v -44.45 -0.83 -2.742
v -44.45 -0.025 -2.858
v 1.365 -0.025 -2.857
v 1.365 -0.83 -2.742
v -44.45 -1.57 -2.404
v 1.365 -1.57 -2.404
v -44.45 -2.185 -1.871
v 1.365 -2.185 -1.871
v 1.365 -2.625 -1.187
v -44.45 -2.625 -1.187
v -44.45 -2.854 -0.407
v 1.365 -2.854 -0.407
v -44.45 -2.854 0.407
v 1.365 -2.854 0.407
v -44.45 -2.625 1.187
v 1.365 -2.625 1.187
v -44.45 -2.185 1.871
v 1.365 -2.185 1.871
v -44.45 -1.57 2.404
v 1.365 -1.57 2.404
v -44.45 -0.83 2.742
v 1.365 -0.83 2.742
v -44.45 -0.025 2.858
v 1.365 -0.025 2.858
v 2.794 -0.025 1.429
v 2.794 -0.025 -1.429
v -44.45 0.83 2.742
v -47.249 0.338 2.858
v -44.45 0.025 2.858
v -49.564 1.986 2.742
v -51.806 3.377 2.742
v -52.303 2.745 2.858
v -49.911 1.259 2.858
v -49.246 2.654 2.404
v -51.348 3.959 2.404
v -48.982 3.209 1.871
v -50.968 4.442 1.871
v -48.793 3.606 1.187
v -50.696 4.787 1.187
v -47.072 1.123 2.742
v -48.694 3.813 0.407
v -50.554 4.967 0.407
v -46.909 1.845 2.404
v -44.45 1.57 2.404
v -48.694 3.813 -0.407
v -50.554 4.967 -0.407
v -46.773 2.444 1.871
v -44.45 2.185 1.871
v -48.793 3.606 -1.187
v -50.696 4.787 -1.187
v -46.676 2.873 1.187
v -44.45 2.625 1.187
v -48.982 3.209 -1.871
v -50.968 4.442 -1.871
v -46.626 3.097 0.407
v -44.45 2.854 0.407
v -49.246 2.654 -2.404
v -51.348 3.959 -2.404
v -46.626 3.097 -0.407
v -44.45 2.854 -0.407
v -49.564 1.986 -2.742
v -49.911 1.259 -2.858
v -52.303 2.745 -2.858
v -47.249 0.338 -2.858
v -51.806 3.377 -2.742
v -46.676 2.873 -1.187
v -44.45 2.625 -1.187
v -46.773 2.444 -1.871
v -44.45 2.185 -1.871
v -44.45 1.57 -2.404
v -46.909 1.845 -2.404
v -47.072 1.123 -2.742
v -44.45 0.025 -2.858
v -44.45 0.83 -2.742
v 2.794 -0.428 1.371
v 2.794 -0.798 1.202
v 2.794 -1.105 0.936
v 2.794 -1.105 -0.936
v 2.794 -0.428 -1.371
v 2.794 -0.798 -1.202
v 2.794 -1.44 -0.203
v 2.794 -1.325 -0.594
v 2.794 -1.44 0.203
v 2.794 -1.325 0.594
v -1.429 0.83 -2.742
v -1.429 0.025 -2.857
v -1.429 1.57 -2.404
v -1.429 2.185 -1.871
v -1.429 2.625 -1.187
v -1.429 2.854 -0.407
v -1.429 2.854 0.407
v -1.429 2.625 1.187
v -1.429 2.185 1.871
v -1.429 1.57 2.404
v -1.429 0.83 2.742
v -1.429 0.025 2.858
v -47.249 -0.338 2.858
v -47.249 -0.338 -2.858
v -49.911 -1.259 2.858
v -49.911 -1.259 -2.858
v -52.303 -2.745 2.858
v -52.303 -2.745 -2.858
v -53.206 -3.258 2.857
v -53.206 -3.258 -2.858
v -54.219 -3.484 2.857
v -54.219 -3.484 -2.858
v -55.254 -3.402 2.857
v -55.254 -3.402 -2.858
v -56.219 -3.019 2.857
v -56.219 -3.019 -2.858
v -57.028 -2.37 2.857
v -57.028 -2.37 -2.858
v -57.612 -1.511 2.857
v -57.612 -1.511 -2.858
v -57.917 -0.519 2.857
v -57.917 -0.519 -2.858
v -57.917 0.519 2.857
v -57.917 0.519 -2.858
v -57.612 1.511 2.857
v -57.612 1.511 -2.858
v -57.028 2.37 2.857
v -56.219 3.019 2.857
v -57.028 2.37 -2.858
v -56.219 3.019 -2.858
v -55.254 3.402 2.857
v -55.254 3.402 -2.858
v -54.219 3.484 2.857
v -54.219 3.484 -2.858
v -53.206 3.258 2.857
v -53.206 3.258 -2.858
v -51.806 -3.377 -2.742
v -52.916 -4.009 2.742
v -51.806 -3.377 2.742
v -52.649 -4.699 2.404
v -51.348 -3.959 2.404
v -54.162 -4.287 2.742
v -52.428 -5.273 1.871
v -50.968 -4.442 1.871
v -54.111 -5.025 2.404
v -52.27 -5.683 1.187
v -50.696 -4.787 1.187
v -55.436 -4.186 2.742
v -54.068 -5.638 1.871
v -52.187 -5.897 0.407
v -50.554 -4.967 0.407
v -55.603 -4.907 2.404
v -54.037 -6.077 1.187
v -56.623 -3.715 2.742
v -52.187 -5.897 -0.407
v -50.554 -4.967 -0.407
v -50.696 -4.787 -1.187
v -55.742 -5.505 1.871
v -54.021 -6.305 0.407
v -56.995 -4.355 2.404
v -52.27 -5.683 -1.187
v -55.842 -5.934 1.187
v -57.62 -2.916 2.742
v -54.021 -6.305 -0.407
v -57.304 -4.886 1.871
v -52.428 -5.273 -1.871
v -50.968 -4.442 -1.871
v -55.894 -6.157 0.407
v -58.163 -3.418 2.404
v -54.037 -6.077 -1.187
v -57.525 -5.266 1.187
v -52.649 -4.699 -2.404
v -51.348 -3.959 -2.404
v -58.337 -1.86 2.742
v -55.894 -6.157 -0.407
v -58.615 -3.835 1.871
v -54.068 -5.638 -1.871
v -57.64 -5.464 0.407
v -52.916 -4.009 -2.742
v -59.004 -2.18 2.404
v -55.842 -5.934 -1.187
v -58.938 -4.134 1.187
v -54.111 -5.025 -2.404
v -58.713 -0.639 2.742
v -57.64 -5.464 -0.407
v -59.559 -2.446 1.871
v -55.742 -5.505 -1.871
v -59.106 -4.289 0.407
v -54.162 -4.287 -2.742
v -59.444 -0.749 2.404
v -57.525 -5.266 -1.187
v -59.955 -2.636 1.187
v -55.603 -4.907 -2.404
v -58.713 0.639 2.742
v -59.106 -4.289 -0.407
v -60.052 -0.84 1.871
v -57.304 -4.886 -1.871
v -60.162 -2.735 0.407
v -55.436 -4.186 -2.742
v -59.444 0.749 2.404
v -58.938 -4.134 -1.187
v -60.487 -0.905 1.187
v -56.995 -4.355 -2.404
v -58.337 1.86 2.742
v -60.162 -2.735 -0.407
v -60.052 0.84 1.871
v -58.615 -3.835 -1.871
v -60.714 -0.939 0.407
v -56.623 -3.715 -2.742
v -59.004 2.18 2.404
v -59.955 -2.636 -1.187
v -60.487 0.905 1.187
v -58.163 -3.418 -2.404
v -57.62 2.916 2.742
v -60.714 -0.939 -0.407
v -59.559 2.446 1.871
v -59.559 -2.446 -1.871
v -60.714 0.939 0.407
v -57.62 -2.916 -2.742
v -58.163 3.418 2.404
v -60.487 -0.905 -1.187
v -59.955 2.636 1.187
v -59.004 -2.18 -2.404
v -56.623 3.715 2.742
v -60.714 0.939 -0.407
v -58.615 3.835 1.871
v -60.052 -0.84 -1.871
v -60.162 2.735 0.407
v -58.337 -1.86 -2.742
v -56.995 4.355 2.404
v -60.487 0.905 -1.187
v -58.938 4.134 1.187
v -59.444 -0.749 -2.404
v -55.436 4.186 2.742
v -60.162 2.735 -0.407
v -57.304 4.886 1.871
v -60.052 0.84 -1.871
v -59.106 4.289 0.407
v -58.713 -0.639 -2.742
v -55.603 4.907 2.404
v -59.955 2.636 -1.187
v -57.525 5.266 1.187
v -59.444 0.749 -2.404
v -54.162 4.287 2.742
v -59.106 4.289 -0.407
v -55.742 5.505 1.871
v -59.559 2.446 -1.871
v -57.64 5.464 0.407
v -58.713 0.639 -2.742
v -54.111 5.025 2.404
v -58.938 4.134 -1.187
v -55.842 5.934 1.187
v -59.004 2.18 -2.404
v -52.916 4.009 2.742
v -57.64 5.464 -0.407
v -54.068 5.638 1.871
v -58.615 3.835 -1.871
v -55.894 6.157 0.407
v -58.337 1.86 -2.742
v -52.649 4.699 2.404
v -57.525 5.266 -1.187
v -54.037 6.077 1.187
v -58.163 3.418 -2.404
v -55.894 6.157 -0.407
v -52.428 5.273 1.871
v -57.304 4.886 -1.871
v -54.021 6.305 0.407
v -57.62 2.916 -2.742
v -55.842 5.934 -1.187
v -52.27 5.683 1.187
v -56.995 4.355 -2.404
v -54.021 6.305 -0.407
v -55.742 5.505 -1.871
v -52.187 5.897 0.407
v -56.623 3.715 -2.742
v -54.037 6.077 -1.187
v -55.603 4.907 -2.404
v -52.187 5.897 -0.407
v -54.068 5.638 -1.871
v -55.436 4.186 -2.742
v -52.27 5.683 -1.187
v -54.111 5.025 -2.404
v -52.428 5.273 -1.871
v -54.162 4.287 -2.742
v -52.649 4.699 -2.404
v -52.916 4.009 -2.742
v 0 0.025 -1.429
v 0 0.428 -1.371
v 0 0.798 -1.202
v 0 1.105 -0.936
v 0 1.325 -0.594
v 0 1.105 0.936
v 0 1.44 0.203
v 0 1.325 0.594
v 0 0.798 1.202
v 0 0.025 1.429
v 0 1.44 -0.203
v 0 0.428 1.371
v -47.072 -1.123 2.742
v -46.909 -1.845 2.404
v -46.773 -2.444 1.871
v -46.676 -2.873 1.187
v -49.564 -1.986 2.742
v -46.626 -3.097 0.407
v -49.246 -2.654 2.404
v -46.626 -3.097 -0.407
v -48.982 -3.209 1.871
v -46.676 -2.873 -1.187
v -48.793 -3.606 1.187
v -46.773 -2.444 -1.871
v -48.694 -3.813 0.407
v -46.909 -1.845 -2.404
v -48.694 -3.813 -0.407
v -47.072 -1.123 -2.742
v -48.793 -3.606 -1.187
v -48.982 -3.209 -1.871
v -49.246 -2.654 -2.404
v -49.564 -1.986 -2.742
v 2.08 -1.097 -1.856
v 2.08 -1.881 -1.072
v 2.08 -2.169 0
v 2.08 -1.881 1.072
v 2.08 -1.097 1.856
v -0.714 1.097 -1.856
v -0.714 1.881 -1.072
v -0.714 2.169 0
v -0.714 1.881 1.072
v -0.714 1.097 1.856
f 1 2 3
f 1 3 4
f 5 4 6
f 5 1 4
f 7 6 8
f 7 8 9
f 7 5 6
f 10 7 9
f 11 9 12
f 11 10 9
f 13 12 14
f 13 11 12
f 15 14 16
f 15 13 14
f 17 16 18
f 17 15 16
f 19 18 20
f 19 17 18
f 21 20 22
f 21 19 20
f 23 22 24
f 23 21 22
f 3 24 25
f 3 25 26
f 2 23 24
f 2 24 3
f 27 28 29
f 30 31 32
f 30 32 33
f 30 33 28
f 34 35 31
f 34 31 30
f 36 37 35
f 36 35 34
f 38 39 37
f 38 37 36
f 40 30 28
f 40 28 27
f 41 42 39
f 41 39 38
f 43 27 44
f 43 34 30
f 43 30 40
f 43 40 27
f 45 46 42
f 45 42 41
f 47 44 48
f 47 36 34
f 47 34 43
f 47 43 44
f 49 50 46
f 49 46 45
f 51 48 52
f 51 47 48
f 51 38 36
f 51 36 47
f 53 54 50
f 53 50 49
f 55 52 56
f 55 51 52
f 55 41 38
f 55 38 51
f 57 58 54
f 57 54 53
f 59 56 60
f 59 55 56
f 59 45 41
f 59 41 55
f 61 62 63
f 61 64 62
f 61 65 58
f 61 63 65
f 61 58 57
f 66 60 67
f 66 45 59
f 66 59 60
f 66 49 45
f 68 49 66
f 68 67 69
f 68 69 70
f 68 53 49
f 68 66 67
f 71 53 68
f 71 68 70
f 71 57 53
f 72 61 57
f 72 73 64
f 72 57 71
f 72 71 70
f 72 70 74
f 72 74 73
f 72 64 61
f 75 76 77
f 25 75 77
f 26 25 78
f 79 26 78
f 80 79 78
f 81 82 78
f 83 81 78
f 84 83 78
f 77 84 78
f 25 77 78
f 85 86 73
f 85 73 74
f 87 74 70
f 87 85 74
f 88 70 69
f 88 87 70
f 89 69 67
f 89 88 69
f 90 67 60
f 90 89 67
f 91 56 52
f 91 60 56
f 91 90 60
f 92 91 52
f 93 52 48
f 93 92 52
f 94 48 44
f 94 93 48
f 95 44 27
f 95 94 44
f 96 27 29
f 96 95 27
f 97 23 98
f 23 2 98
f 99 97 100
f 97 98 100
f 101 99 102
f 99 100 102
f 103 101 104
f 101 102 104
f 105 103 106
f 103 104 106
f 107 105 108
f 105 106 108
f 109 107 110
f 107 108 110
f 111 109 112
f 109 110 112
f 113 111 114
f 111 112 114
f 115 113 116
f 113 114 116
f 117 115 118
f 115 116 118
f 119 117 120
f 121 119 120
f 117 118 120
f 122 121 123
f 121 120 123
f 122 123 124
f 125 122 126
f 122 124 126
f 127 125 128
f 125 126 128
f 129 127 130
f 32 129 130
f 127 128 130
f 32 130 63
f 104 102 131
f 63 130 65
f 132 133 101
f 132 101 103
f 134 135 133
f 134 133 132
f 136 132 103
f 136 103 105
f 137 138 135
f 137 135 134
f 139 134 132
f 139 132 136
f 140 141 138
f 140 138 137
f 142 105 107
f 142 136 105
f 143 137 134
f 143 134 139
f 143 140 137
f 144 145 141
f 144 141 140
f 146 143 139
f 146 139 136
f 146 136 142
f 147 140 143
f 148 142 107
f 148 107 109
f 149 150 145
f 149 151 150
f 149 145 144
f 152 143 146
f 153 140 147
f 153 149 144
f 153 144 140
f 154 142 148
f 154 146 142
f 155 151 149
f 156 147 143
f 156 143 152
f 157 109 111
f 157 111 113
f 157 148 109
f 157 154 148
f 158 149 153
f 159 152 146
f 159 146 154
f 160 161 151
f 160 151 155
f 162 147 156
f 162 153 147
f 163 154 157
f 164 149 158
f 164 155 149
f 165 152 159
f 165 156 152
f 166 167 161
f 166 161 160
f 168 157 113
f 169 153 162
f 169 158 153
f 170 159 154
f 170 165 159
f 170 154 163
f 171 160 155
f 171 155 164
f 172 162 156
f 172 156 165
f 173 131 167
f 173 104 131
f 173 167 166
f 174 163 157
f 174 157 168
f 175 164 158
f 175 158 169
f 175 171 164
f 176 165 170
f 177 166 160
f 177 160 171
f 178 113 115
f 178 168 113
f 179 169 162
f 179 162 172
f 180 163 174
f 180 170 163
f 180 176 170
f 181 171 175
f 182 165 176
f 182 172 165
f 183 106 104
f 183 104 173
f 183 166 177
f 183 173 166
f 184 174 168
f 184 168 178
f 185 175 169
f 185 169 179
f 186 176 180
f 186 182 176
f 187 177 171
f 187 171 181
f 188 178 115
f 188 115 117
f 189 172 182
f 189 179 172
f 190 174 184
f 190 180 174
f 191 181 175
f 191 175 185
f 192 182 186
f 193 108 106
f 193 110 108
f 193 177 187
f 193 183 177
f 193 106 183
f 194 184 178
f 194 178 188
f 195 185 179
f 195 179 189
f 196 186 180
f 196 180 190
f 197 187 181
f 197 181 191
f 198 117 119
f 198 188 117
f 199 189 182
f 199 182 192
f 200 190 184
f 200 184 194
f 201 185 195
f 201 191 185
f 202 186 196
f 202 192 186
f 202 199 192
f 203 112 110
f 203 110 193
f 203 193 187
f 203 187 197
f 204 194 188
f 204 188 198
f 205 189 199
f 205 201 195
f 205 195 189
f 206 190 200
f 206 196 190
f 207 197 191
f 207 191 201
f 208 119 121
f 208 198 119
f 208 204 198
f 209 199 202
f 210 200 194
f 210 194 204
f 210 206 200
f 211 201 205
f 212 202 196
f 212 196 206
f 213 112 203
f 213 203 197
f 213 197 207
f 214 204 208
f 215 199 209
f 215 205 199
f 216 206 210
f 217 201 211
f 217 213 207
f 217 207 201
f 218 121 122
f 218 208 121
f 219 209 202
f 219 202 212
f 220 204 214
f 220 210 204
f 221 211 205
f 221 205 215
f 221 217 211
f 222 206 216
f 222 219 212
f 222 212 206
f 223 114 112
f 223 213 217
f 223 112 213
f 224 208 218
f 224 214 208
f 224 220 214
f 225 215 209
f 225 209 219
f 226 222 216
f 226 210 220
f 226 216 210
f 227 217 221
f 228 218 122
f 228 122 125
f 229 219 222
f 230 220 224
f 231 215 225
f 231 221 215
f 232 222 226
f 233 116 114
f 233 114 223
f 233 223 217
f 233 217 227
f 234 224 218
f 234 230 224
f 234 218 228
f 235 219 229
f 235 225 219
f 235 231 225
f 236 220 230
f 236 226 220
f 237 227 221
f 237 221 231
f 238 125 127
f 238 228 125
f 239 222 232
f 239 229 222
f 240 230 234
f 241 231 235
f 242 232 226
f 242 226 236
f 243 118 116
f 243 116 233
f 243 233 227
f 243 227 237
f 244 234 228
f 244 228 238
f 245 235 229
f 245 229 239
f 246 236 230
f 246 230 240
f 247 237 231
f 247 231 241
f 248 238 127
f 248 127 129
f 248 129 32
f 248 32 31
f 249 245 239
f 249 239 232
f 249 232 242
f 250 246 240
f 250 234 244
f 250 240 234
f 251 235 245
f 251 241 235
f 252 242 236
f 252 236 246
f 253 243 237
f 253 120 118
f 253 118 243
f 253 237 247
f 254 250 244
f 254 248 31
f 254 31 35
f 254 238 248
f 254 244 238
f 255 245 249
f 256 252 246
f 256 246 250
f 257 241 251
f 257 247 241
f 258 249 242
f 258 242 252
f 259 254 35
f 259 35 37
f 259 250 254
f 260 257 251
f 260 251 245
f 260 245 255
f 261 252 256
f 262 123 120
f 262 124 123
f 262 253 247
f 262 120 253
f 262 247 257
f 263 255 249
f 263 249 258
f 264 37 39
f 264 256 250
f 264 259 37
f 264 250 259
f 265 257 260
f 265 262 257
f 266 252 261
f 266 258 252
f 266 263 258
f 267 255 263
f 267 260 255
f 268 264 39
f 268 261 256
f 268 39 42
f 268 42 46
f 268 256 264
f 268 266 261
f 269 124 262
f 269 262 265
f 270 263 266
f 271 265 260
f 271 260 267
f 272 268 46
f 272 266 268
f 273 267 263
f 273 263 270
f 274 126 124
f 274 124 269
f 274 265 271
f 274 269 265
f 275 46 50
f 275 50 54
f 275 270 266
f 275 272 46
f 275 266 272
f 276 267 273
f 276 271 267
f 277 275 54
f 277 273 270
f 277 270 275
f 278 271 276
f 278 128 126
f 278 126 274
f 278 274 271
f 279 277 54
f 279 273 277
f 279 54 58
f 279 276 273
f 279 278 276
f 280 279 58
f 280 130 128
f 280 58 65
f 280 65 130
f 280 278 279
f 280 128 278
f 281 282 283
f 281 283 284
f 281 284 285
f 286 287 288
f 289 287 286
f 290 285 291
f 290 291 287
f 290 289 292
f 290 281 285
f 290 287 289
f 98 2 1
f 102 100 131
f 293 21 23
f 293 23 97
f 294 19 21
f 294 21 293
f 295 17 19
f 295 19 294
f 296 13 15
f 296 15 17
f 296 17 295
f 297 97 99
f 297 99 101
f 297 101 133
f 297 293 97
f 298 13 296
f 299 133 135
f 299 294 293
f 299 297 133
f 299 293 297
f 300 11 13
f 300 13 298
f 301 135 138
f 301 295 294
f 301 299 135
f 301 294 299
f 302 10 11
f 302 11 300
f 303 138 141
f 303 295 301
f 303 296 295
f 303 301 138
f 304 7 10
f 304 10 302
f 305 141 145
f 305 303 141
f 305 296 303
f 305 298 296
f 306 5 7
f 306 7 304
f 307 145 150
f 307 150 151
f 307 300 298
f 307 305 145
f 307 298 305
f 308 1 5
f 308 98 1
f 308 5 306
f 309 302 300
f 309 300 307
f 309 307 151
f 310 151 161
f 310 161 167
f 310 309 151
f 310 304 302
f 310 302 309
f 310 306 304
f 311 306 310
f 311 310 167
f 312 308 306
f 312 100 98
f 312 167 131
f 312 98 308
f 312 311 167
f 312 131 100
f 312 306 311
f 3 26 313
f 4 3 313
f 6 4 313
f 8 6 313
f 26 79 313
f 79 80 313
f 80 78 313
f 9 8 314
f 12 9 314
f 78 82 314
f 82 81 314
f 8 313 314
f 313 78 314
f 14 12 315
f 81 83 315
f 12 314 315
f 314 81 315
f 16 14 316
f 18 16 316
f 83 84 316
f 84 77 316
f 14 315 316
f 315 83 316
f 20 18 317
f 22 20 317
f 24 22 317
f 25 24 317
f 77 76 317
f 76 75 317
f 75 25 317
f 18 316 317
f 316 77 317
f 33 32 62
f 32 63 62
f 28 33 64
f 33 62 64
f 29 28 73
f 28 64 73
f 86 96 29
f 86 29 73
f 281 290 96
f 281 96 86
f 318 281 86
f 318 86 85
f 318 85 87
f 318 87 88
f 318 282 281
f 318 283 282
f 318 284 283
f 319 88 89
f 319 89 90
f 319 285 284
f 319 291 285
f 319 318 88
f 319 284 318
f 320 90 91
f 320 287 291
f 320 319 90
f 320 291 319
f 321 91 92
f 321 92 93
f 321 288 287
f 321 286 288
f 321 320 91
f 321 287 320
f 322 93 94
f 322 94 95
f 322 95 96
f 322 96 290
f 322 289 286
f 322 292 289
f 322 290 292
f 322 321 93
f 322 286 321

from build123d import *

# Parameters (mm, degrees)
CHAMFER1_SIZE = 1.42875


with BuildPart() as part:
    # Sweep1: sweep along a path in Sketch1
    with BuildLine(Plane.XY) as sweep1_path:
        Line((2.794, -0.0254), (-44.45, -0.0254))
        ThreePointArc((-44.45, -0.0254), (-48.605420273, -0.724463272), (-52.303375713, -2.744694118))
        ThreePointArc((-52.303375713, -2.744694118), (-57.955554034, 0), (-52.303375713, 2.744694118))
        ThreePointArc((-52.303375713, 2.744694118), (-48.605420273, 0.724463272), (-44.45, 0.0254))
        Line((-44.45, 0.0254), (0, 0.0254))
    # Sketch2 → Sweep1 (sweep)
    with BuildSketch(Plane(origin=(0, 0, 0), x_dir=(0, 0, -1), z_dir=(1, 0, 0))):
        with BuildLine():
            Line((-2.8575, 0.0254), (2.8575, 0.0254))
            ThreePointArc((2.8575, 0.0254), (0, 2.8829), (-2.8575, 0.0254))
        make_face()
    sweep(path=sweep1_path.line)

    # Chamfer1
    chamfer1_edges = [part.edges().sort_by_distance(p)[0] for p in [
        (2.794, -2.8829, 0),
        (0, 2.8829, 0),
    ]]
    chamfer(chamfer1_edges, length=CHAMFER1_SIZE)


solid = part.part
